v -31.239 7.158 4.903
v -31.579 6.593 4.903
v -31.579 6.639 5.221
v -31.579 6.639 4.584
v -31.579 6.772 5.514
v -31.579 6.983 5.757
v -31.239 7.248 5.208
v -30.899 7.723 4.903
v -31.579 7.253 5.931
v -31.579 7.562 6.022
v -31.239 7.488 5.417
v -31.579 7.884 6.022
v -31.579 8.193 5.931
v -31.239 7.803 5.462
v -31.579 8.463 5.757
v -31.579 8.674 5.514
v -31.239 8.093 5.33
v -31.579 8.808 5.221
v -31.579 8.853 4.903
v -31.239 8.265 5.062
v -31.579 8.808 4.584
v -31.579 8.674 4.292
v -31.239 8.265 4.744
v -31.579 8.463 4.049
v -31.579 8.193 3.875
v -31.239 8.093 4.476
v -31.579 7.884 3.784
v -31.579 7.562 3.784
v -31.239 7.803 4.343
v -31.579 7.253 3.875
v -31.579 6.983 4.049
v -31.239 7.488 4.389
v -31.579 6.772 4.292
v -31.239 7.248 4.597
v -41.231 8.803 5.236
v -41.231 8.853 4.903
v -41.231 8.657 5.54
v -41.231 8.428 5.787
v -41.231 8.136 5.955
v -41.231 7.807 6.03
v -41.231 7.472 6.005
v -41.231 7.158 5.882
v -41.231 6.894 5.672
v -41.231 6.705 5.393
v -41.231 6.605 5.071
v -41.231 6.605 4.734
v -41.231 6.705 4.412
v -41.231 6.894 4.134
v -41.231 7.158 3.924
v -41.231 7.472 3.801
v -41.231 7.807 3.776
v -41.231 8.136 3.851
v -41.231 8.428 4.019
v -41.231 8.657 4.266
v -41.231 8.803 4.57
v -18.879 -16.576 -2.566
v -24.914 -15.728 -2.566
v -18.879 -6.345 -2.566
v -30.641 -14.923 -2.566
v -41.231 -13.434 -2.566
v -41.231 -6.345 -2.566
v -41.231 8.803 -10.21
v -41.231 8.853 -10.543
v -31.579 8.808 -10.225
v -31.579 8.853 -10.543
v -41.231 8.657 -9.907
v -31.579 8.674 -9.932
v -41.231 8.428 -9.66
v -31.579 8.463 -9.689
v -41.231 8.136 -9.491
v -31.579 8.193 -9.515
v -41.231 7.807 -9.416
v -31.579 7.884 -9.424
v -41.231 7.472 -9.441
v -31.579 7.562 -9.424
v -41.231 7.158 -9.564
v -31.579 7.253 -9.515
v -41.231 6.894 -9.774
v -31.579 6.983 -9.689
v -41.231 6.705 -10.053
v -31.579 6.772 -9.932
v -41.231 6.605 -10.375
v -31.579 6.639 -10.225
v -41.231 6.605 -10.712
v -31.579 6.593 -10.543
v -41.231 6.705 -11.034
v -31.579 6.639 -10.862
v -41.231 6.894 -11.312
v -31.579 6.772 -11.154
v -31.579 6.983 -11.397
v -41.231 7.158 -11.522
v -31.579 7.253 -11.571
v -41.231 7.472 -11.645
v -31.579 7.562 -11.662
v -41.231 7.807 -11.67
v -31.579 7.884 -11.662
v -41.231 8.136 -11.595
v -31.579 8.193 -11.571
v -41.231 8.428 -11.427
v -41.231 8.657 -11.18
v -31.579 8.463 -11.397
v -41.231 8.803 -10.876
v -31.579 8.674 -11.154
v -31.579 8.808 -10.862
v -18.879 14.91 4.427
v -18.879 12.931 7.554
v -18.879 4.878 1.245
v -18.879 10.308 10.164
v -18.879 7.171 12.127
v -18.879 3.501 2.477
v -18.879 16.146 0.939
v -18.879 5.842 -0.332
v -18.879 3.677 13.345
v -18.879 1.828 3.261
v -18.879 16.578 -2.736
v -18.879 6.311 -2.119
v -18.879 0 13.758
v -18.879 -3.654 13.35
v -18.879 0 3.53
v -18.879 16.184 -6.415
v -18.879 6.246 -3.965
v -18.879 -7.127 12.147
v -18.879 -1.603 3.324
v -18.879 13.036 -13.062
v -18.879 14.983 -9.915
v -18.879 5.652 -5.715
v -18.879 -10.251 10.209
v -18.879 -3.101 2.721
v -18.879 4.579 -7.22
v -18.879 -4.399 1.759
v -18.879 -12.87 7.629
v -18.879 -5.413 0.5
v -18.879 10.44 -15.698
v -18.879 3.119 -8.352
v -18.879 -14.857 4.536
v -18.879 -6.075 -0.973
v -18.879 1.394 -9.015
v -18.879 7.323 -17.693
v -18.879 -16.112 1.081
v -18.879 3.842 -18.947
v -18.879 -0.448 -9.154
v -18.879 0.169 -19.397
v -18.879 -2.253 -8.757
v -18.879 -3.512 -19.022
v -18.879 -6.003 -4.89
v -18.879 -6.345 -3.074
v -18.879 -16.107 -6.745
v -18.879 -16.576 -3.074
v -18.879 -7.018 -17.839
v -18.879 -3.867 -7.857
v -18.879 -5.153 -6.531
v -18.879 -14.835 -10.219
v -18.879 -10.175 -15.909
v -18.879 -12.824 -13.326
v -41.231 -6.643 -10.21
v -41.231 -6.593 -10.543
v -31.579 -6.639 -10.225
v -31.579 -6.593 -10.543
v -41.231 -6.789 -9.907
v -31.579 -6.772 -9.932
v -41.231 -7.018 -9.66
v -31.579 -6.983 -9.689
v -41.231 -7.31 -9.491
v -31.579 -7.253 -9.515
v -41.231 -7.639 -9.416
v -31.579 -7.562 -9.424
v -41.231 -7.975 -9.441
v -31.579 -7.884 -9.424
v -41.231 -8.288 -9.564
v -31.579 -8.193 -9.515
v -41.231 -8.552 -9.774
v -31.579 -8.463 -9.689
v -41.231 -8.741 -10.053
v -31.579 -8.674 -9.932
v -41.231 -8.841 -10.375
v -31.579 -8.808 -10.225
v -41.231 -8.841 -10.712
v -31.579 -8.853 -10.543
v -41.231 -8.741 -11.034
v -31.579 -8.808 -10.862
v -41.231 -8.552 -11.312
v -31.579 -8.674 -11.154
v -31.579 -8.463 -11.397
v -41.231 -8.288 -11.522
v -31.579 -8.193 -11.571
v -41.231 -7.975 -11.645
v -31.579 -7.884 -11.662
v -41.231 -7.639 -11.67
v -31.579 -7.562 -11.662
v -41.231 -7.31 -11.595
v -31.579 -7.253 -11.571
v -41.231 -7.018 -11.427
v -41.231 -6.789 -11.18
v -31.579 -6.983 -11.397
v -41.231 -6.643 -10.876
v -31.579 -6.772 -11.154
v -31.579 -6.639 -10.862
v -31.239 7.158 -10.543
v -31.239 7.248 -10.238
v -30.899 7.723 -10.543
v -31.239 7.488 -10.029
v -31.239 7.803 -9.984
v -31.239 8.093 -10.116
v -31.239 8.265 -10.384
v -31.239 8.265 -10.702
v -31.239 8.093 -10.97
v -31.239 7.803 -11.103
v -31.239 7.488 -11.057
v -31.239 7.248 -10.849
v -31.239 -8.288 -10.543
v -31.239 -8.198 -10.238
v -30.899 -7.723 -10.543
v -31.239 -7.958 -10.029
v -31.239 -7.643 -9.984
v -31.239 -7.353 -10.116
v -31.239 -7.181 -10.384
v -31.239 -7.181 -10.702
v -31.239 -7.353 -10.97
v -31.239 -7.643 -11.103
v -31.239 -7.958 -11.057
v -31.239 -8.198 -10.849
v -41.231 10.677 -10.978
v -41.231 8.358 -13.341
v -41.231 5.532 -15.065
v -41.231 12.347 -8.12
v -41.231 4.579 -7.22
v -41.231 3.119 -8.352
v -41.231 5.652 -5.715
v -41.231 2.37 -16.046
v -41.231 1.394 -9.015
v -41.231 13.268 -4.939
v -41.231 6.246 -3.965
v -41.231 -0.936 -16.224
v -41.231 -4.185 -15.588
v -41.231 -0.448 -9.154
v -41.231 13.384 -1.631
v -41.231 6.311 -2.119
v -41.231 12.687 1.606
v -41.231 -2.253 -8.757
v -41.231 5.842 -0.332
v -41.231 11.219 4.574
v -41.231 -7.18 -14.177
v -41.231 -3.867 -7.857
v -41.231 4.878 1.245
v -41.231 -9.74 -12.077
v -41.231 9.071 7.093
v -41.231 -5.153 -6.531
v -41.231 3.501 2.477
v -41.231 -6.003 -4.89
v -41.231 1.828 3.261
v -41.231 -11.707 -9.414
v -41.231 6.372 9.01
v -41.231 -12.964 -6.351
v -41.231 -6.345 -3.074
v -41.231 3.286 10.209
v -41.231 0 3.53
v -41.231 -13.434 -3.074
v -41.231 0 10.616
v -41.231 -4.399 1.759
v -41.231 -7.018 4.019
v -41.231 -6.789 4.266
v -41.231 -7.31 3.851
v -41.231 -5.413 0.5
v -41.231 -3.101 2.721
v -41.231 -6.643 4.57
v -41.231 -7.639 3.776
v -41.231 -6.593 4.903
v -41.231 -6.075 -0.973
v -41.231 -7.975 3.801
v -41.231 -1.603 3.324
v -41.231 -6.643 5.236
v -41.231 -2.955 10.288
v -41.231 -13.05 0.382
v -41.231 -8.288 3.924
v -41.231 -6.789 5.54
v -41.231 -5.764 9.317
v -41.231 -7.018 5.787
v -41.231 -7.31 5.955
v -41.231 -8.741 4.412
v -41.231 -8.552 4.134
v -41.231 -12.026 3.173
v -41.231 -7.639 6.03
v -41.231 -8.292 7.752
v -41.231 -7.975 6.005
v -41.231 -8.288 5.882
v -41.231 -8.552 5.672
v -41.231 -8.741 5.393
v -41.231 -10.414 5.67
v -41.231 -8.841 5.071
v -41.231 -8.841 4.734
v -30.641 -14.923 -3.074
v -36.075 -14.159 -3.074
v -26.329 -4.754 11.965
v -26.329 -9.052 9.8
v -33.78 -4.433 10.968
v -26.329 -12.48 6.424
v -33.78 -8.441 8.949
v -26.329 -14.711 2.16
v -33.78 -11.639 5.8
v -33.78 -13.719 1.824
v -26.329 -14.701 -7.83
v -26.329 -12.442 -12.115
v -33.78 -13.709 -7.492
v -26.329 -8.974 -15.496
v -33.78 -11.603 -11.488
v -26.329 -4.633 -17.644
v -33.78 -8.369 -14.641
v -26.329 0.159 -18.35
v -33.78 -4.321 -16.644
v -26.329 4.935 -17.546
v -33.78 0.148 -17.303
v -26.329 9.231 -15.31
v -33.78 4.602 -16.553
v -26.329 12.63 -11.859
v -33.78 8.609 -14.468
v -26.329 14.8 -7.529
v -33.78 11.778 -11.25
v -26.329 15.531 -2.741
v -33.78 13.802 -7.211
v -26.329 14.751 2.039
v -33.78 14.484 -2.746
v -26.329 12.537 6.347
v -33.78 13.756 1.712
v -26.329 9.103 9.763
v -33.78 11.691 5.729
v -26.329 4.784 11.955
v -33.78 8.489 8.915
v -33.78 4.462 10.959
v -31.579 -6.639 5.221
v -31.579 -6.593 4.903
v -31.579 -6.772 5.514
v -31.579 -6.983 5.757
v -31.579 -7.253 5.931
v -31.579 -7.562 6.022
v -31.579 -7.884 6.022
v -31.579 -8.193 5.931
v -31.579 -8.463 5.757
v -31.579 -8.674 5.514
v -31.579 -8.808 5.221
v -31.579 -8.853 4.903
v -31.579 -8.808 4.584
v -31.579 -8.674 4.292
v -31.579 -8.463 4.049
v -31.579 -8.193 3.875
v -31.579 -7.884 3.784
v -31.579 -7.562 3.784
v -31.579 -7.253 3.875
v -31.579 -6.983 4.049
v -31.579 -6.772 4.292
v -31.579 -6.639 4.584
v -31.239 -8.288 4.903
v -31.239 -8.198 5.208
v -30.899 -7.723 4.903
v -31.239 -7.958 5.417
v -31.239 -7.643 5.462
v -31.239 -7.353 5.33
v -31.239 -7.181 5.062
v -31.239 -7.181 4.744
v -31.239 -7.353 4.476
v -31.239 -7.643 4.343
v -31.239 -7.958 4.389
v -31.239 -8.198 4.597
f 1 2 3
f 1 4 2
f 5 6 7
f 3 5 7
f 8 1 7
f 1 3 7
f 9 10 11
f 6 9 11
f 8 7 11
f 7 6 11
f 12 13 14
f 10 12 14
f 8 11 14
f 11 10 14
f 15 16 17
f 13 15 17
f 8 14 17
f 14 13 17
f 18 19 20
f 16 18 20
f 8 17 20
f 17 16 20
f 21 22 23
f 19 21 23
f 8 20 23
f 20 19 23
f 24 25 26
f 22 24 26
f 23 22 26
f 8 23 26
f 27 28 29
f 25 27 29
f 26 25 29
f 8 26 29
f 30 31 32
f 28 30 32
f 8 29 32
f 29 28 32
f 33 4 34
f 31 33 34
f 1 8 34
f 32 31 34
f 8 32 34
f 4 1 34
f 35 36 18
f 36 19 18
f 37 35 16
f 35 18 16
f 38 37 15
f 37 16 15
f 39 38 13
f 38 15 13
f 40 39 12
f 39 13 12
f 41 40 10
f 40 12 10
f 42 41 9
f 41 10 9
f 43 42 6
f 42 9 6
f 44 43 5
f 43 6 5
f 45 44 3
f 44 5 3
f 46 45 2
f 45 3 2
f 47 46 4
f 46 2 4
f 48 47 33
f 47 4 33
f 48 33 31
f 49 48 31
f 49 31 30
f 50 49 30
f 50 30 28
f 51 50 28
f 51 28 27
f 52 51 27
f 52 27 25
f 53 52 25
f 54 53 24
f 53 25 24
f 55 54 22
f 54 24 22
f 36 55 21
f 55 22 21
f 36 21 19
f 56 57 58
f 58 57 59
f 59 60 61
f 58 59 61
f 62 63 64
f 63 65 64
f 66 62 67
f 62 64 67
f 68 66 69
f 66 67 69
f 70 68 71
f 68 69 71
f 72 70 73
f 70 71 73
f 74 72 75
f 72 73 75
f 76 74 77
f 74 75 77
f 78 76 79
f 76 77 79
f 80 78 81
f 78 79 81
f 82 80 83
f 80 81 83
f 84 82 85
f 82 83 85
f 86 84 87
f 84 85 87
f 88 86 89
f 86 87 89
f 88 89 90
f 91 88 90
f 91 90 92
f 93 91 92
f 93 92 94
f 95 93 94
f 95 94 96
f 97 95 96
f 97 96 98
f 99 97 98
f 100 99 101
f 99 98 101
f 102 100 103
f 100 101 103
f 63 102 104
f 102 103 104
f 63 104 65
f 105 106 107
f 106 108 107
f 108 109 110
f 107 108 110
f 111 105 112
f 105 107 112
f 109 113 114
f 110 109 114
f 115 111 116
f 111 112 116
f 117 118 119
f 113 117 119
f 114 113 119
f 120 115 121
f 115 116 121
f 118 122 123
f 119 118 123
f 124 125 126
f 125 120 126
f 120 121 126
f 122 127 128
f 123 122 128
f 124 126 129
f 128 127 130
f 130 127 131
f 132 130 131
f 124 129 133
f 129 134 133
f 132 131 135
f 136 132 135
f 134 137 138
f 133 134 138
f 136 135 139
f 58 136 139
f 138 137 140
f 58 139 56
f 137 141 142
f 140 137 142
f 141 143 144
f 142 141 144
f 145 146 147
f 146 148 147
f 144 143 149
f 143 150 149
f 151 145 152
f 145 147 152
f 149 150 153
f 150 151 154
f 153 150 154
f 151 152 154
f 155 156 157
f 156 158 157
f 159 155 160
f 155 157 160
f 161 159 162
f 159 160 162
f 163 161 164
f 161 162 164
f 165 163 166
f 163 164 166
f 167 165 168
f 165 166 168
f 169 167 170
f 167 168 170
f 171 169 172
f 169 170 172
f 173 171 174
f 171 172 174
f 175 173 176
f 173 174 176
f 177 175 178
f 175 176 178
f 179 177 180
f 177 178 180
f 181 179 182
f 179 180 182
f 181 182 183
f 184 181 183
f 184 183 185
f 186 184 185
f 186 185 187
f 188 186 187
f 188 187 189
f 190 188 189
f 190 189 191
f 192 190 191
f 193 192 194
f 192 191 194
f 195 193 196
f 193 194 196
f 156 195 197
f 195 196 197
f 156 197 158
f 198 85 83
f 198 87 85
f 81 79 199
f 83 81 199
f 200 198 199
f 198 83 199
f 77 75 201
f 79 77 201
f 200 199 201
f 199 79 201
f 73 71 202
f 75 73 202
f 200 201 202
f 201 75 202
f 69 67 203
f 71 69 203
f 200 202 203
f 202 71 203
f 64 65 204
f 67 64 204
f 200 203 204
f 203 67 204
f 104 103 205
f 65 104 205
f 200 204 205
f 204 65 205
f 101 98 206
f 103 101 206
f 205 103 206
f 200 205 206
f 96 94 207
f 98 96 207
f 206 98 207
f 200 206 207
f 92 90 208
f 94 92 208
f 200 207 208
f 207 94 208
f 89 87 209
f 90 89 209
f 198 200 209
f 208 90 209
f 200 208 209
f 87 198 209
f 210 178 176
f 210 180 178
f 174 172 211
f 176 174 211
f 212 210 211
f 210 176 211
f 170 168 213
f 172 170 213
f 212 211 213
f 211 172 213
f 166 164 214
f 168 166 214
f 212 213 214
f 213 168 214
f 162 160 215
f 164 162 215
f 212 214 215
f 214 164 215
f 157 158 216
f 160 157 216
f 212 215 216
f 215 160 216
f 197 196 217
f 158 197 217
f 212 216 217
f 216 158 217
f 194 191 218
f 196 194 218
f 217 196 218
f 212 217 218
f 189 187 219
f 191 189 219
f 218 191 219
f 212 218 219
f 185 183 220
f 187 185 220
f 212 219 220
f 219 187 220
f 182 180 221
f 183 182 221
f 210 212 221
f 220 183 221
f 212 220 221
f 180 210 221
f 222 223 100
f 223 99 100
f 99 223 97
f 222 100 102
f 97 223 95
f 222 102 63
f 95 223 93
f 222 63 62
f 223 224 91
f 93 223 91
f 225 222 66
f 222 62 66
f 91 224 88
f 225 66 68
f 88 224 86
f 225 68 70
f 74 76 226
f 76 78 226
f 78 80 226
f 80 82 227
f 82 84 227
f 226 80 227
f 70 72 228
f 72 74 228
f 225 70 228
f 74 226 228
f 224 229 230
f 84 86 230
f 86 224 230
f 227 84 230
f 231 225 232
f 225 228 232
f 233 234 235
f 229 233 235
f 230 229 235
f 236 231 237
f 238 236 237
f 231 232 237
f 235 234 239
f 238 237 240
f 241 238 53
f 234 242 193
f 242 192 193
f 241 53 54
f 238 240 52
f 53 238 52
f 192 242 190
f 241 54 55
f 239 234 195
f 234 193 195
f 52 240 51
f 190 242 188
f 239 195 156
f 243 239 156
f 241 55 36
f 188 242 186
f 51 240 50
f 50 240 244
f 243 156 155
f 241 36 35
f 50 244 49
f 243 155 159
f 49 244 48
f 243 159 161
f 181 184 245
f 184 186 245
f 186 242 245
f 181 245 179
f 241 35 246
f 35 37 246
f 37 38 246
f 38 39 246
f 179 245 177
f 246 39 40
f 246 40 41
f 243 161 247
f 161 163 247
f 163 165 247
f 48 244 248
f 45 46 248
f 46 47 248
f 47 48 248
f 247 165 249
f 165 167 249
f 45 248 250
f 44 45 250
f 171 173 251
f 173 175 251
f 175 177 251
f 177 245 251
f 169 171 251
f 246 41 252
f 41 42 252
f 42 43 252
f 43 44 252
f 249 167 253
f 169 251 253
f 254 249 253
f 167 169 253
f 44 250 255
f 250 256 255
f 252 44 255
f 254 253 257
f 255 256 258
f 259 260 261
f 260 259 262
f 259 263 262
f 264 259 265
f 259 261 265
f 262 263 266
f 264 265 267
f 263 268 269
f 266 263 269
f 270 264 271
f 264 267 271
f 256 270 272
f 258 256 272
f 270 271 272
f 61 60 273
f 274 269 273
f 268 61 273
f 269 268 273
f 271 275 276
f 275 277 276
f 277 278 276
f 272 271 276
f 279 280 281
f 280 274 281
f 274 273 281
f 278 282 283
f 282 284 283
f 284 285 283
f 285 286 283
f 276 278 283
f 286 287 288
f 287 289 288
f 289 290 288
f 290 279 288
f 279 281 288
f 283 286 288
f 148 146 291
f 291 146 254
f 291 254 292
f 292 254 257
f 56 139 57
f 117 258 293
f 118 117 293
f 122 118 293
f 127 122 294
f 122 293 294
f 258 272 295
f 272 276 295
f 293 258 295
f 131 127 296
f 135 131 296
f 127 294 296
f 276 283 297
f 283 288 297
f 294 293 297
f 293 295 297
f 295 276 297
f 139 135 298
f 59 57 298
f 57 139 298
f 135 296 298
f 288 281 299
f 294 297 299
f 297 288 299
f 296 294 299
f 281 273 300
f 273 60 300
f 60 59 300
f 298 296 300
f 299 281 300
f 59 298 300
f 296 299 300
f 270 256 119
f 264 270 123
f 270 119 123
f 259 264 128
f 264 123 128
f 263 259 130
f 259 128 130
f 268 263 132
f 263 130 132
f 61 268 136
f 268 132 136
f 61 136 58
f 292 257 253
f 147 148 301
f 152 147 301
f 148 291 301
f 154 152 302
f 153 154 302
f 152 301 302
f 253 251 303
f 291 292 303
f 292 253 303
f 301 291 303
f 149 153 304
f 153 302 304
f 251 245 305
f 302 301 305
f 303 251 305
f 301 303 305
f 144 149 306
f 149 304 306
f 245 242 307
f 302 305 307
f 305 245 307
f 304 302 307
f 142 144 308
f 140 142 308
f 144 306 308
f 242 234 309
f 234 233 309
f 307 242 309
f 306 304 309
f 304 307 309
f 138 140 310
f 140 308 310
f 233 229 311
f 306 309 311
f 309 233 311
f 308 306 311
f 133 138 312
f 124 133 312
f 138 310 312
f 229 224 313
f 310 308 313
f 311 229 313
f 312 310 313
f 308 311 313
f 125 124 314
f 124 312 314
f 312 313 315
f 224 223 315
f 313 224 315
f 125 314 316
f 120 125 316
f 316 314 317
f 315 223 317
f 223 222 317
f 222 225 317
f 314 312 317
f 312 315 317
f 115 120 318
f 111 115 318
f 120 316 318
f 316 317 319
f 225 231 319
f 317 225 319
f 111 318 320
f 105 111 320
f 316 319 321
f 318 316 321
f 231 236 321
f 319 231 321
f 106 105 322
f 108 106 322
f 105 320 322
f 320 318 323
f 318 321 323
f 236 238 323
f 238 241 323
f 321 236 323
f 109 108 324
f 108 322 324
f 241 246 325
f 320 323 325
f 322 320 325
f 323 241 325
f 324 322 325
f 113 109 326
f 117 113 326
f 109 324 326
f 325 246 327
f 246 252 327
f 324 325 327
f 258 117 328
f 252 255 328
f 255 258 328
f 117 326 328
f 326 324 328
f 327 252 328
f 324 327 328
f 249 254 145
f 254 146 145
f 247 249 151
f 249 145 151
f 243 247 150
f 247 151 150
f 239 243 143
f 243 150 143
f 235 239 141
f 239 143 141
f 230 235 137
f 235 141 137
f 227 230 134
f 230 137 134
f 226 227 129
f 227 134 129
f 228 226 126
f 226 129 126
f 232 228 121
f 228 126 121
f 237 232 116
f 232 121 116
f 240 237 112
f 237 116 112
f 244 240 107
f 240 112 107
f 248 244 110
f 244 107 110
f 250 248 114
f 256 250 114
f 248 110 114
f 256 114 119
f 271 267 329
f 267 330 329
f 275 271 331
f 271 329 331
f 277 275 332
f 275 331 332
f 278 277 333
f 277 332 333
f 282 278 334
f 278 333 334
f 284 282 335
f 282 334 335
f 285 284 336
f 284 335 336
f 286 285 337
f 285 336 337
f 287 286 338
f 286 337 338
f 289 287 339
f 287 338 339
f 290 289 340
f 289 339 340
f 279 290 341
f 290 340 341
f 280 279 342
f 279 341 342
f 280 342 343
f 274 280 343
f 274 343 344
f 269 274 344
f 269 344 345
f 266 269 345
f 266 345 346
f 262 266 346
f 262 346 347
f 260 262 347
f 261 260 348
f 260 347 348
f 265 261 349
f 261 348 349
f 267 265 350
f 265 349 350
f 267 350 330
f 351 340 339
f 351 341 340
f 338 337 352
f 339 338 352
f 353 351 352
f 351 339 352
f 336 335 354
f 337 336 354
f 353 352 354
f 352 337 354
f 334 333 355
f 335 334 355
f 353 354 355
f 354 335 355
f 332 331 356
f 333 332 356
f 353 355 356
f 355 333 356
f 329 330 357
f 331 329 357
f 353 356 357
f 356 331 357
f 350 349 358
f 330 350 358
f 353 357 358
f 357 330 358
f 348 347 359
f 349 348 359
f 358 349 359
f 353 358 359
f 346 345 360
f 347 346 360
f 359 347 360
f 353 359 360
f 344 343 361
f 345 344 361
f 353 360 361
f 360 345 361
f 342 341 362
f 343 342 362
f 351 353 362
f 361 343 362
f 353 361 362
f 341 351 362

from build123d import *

# Parameters (mm, degrees)
F3_DEPTH = 22.353
F4_D     = 2.2606
F4_DEPTH = 9.652
F4_TIP   = 0.6791527577


with BuildPart() as f1:
    # F0 (on Front) → F1 (revolve)
    with BuildSketch(Plane.XZ):
        Polygon((-18.8786415076, 13.7577650476), (-41.2306415076, 10.6163963103), (-41.2306415076, 3.5297963103), (-18.8786415076, 3.5297963103), align=None)
    revolve(axis=Axis((-30.0546415076, 0, -2.8202036897), (1, 0, 0)))

    # F2 (on face) → F3 (cut, through all)
    with BuildSketch(Plane(origin=(-41.2306415076, 0, 0), x_dir=(0, -1, 0), z_dir=(-1, 0, 0))):
        with BuildLine():
            Line((13.4341990293, -2.5662036897), (6.3449179664, -2.5662036897))
            ThreePointArc((6.3449179664, -2.5662036897), (6.3487293645, -2.6931782719), (6.35, -2.8202036897))
            ThreePointArc((6.35, -2.8202036897), (6.3487293645, -2.9472291075), (6.3449179664, -3.0742036897))
            Line((6.3449179664, -3.0742036897), (13.4341990293, -3.0742036897))
            ThreePointArc((13.4341990293, -3.0742036897), (13.4359997439, -2.9472093634), (13.4366, -2.8202036897))
            ThreePointArc((13.4366, -2.8202036897), (13.4359997439, -2.6931980159), (13.4341990293, -2.5662036897))
        make_face()
        with BuildLine():
            Line((16.5760227876, -2.5662036897), (13.4341990293, -2.5662036897))
            ThreePointArc((13.4341990293, -2.5662036897), (13.4359997439, -2.6931980159), (13.4366, -2.8202036897))
            ThreePointArc((13.4366, -2.8202036897), (13.4359997439, -2.9472093634), (13.4341990293, -3.0742036897))
            Line((13.4341990293, -3.0742036897), (16.5760227876, -3.0742036897))
            ThreePointArc((16.5760227876, -3.0742036897), (16.5774822427, -2.9472074167), (16.5779687373, -2.8202036897))
            ThreePointArc((16.5779687373, -2.8202036897), (16.5774822427, -2.6931999627), (16.5760227876, -2.5662036897))
        make_face()
    extrude(amount=-F3_DEPTH, mode=Mode.SUBTRACT)

    # F4
    with Locations(Plane(origin=(-41.2306415076, 0, 0), x_dir=(0, -1, 0), z_dir=(-1, 0, 0))):
        with Locations((-7.7230202641, 4.9028165744), (7.7230202641, 4.9028165744), (7.7230202641, -10.5432239538), (-7.7230202641, -10.5432239538)):
            Hole(F4_D / 2, depth=F4_DEPTH)
            with Locations((0, 0, -(F4_DEPTH + F4_TIP / 2))):  # 118° drill point
                Cone(0, F4_D / 2, F4_TIP, mode=Mode.SUBTRACT)


solid = f1.part
